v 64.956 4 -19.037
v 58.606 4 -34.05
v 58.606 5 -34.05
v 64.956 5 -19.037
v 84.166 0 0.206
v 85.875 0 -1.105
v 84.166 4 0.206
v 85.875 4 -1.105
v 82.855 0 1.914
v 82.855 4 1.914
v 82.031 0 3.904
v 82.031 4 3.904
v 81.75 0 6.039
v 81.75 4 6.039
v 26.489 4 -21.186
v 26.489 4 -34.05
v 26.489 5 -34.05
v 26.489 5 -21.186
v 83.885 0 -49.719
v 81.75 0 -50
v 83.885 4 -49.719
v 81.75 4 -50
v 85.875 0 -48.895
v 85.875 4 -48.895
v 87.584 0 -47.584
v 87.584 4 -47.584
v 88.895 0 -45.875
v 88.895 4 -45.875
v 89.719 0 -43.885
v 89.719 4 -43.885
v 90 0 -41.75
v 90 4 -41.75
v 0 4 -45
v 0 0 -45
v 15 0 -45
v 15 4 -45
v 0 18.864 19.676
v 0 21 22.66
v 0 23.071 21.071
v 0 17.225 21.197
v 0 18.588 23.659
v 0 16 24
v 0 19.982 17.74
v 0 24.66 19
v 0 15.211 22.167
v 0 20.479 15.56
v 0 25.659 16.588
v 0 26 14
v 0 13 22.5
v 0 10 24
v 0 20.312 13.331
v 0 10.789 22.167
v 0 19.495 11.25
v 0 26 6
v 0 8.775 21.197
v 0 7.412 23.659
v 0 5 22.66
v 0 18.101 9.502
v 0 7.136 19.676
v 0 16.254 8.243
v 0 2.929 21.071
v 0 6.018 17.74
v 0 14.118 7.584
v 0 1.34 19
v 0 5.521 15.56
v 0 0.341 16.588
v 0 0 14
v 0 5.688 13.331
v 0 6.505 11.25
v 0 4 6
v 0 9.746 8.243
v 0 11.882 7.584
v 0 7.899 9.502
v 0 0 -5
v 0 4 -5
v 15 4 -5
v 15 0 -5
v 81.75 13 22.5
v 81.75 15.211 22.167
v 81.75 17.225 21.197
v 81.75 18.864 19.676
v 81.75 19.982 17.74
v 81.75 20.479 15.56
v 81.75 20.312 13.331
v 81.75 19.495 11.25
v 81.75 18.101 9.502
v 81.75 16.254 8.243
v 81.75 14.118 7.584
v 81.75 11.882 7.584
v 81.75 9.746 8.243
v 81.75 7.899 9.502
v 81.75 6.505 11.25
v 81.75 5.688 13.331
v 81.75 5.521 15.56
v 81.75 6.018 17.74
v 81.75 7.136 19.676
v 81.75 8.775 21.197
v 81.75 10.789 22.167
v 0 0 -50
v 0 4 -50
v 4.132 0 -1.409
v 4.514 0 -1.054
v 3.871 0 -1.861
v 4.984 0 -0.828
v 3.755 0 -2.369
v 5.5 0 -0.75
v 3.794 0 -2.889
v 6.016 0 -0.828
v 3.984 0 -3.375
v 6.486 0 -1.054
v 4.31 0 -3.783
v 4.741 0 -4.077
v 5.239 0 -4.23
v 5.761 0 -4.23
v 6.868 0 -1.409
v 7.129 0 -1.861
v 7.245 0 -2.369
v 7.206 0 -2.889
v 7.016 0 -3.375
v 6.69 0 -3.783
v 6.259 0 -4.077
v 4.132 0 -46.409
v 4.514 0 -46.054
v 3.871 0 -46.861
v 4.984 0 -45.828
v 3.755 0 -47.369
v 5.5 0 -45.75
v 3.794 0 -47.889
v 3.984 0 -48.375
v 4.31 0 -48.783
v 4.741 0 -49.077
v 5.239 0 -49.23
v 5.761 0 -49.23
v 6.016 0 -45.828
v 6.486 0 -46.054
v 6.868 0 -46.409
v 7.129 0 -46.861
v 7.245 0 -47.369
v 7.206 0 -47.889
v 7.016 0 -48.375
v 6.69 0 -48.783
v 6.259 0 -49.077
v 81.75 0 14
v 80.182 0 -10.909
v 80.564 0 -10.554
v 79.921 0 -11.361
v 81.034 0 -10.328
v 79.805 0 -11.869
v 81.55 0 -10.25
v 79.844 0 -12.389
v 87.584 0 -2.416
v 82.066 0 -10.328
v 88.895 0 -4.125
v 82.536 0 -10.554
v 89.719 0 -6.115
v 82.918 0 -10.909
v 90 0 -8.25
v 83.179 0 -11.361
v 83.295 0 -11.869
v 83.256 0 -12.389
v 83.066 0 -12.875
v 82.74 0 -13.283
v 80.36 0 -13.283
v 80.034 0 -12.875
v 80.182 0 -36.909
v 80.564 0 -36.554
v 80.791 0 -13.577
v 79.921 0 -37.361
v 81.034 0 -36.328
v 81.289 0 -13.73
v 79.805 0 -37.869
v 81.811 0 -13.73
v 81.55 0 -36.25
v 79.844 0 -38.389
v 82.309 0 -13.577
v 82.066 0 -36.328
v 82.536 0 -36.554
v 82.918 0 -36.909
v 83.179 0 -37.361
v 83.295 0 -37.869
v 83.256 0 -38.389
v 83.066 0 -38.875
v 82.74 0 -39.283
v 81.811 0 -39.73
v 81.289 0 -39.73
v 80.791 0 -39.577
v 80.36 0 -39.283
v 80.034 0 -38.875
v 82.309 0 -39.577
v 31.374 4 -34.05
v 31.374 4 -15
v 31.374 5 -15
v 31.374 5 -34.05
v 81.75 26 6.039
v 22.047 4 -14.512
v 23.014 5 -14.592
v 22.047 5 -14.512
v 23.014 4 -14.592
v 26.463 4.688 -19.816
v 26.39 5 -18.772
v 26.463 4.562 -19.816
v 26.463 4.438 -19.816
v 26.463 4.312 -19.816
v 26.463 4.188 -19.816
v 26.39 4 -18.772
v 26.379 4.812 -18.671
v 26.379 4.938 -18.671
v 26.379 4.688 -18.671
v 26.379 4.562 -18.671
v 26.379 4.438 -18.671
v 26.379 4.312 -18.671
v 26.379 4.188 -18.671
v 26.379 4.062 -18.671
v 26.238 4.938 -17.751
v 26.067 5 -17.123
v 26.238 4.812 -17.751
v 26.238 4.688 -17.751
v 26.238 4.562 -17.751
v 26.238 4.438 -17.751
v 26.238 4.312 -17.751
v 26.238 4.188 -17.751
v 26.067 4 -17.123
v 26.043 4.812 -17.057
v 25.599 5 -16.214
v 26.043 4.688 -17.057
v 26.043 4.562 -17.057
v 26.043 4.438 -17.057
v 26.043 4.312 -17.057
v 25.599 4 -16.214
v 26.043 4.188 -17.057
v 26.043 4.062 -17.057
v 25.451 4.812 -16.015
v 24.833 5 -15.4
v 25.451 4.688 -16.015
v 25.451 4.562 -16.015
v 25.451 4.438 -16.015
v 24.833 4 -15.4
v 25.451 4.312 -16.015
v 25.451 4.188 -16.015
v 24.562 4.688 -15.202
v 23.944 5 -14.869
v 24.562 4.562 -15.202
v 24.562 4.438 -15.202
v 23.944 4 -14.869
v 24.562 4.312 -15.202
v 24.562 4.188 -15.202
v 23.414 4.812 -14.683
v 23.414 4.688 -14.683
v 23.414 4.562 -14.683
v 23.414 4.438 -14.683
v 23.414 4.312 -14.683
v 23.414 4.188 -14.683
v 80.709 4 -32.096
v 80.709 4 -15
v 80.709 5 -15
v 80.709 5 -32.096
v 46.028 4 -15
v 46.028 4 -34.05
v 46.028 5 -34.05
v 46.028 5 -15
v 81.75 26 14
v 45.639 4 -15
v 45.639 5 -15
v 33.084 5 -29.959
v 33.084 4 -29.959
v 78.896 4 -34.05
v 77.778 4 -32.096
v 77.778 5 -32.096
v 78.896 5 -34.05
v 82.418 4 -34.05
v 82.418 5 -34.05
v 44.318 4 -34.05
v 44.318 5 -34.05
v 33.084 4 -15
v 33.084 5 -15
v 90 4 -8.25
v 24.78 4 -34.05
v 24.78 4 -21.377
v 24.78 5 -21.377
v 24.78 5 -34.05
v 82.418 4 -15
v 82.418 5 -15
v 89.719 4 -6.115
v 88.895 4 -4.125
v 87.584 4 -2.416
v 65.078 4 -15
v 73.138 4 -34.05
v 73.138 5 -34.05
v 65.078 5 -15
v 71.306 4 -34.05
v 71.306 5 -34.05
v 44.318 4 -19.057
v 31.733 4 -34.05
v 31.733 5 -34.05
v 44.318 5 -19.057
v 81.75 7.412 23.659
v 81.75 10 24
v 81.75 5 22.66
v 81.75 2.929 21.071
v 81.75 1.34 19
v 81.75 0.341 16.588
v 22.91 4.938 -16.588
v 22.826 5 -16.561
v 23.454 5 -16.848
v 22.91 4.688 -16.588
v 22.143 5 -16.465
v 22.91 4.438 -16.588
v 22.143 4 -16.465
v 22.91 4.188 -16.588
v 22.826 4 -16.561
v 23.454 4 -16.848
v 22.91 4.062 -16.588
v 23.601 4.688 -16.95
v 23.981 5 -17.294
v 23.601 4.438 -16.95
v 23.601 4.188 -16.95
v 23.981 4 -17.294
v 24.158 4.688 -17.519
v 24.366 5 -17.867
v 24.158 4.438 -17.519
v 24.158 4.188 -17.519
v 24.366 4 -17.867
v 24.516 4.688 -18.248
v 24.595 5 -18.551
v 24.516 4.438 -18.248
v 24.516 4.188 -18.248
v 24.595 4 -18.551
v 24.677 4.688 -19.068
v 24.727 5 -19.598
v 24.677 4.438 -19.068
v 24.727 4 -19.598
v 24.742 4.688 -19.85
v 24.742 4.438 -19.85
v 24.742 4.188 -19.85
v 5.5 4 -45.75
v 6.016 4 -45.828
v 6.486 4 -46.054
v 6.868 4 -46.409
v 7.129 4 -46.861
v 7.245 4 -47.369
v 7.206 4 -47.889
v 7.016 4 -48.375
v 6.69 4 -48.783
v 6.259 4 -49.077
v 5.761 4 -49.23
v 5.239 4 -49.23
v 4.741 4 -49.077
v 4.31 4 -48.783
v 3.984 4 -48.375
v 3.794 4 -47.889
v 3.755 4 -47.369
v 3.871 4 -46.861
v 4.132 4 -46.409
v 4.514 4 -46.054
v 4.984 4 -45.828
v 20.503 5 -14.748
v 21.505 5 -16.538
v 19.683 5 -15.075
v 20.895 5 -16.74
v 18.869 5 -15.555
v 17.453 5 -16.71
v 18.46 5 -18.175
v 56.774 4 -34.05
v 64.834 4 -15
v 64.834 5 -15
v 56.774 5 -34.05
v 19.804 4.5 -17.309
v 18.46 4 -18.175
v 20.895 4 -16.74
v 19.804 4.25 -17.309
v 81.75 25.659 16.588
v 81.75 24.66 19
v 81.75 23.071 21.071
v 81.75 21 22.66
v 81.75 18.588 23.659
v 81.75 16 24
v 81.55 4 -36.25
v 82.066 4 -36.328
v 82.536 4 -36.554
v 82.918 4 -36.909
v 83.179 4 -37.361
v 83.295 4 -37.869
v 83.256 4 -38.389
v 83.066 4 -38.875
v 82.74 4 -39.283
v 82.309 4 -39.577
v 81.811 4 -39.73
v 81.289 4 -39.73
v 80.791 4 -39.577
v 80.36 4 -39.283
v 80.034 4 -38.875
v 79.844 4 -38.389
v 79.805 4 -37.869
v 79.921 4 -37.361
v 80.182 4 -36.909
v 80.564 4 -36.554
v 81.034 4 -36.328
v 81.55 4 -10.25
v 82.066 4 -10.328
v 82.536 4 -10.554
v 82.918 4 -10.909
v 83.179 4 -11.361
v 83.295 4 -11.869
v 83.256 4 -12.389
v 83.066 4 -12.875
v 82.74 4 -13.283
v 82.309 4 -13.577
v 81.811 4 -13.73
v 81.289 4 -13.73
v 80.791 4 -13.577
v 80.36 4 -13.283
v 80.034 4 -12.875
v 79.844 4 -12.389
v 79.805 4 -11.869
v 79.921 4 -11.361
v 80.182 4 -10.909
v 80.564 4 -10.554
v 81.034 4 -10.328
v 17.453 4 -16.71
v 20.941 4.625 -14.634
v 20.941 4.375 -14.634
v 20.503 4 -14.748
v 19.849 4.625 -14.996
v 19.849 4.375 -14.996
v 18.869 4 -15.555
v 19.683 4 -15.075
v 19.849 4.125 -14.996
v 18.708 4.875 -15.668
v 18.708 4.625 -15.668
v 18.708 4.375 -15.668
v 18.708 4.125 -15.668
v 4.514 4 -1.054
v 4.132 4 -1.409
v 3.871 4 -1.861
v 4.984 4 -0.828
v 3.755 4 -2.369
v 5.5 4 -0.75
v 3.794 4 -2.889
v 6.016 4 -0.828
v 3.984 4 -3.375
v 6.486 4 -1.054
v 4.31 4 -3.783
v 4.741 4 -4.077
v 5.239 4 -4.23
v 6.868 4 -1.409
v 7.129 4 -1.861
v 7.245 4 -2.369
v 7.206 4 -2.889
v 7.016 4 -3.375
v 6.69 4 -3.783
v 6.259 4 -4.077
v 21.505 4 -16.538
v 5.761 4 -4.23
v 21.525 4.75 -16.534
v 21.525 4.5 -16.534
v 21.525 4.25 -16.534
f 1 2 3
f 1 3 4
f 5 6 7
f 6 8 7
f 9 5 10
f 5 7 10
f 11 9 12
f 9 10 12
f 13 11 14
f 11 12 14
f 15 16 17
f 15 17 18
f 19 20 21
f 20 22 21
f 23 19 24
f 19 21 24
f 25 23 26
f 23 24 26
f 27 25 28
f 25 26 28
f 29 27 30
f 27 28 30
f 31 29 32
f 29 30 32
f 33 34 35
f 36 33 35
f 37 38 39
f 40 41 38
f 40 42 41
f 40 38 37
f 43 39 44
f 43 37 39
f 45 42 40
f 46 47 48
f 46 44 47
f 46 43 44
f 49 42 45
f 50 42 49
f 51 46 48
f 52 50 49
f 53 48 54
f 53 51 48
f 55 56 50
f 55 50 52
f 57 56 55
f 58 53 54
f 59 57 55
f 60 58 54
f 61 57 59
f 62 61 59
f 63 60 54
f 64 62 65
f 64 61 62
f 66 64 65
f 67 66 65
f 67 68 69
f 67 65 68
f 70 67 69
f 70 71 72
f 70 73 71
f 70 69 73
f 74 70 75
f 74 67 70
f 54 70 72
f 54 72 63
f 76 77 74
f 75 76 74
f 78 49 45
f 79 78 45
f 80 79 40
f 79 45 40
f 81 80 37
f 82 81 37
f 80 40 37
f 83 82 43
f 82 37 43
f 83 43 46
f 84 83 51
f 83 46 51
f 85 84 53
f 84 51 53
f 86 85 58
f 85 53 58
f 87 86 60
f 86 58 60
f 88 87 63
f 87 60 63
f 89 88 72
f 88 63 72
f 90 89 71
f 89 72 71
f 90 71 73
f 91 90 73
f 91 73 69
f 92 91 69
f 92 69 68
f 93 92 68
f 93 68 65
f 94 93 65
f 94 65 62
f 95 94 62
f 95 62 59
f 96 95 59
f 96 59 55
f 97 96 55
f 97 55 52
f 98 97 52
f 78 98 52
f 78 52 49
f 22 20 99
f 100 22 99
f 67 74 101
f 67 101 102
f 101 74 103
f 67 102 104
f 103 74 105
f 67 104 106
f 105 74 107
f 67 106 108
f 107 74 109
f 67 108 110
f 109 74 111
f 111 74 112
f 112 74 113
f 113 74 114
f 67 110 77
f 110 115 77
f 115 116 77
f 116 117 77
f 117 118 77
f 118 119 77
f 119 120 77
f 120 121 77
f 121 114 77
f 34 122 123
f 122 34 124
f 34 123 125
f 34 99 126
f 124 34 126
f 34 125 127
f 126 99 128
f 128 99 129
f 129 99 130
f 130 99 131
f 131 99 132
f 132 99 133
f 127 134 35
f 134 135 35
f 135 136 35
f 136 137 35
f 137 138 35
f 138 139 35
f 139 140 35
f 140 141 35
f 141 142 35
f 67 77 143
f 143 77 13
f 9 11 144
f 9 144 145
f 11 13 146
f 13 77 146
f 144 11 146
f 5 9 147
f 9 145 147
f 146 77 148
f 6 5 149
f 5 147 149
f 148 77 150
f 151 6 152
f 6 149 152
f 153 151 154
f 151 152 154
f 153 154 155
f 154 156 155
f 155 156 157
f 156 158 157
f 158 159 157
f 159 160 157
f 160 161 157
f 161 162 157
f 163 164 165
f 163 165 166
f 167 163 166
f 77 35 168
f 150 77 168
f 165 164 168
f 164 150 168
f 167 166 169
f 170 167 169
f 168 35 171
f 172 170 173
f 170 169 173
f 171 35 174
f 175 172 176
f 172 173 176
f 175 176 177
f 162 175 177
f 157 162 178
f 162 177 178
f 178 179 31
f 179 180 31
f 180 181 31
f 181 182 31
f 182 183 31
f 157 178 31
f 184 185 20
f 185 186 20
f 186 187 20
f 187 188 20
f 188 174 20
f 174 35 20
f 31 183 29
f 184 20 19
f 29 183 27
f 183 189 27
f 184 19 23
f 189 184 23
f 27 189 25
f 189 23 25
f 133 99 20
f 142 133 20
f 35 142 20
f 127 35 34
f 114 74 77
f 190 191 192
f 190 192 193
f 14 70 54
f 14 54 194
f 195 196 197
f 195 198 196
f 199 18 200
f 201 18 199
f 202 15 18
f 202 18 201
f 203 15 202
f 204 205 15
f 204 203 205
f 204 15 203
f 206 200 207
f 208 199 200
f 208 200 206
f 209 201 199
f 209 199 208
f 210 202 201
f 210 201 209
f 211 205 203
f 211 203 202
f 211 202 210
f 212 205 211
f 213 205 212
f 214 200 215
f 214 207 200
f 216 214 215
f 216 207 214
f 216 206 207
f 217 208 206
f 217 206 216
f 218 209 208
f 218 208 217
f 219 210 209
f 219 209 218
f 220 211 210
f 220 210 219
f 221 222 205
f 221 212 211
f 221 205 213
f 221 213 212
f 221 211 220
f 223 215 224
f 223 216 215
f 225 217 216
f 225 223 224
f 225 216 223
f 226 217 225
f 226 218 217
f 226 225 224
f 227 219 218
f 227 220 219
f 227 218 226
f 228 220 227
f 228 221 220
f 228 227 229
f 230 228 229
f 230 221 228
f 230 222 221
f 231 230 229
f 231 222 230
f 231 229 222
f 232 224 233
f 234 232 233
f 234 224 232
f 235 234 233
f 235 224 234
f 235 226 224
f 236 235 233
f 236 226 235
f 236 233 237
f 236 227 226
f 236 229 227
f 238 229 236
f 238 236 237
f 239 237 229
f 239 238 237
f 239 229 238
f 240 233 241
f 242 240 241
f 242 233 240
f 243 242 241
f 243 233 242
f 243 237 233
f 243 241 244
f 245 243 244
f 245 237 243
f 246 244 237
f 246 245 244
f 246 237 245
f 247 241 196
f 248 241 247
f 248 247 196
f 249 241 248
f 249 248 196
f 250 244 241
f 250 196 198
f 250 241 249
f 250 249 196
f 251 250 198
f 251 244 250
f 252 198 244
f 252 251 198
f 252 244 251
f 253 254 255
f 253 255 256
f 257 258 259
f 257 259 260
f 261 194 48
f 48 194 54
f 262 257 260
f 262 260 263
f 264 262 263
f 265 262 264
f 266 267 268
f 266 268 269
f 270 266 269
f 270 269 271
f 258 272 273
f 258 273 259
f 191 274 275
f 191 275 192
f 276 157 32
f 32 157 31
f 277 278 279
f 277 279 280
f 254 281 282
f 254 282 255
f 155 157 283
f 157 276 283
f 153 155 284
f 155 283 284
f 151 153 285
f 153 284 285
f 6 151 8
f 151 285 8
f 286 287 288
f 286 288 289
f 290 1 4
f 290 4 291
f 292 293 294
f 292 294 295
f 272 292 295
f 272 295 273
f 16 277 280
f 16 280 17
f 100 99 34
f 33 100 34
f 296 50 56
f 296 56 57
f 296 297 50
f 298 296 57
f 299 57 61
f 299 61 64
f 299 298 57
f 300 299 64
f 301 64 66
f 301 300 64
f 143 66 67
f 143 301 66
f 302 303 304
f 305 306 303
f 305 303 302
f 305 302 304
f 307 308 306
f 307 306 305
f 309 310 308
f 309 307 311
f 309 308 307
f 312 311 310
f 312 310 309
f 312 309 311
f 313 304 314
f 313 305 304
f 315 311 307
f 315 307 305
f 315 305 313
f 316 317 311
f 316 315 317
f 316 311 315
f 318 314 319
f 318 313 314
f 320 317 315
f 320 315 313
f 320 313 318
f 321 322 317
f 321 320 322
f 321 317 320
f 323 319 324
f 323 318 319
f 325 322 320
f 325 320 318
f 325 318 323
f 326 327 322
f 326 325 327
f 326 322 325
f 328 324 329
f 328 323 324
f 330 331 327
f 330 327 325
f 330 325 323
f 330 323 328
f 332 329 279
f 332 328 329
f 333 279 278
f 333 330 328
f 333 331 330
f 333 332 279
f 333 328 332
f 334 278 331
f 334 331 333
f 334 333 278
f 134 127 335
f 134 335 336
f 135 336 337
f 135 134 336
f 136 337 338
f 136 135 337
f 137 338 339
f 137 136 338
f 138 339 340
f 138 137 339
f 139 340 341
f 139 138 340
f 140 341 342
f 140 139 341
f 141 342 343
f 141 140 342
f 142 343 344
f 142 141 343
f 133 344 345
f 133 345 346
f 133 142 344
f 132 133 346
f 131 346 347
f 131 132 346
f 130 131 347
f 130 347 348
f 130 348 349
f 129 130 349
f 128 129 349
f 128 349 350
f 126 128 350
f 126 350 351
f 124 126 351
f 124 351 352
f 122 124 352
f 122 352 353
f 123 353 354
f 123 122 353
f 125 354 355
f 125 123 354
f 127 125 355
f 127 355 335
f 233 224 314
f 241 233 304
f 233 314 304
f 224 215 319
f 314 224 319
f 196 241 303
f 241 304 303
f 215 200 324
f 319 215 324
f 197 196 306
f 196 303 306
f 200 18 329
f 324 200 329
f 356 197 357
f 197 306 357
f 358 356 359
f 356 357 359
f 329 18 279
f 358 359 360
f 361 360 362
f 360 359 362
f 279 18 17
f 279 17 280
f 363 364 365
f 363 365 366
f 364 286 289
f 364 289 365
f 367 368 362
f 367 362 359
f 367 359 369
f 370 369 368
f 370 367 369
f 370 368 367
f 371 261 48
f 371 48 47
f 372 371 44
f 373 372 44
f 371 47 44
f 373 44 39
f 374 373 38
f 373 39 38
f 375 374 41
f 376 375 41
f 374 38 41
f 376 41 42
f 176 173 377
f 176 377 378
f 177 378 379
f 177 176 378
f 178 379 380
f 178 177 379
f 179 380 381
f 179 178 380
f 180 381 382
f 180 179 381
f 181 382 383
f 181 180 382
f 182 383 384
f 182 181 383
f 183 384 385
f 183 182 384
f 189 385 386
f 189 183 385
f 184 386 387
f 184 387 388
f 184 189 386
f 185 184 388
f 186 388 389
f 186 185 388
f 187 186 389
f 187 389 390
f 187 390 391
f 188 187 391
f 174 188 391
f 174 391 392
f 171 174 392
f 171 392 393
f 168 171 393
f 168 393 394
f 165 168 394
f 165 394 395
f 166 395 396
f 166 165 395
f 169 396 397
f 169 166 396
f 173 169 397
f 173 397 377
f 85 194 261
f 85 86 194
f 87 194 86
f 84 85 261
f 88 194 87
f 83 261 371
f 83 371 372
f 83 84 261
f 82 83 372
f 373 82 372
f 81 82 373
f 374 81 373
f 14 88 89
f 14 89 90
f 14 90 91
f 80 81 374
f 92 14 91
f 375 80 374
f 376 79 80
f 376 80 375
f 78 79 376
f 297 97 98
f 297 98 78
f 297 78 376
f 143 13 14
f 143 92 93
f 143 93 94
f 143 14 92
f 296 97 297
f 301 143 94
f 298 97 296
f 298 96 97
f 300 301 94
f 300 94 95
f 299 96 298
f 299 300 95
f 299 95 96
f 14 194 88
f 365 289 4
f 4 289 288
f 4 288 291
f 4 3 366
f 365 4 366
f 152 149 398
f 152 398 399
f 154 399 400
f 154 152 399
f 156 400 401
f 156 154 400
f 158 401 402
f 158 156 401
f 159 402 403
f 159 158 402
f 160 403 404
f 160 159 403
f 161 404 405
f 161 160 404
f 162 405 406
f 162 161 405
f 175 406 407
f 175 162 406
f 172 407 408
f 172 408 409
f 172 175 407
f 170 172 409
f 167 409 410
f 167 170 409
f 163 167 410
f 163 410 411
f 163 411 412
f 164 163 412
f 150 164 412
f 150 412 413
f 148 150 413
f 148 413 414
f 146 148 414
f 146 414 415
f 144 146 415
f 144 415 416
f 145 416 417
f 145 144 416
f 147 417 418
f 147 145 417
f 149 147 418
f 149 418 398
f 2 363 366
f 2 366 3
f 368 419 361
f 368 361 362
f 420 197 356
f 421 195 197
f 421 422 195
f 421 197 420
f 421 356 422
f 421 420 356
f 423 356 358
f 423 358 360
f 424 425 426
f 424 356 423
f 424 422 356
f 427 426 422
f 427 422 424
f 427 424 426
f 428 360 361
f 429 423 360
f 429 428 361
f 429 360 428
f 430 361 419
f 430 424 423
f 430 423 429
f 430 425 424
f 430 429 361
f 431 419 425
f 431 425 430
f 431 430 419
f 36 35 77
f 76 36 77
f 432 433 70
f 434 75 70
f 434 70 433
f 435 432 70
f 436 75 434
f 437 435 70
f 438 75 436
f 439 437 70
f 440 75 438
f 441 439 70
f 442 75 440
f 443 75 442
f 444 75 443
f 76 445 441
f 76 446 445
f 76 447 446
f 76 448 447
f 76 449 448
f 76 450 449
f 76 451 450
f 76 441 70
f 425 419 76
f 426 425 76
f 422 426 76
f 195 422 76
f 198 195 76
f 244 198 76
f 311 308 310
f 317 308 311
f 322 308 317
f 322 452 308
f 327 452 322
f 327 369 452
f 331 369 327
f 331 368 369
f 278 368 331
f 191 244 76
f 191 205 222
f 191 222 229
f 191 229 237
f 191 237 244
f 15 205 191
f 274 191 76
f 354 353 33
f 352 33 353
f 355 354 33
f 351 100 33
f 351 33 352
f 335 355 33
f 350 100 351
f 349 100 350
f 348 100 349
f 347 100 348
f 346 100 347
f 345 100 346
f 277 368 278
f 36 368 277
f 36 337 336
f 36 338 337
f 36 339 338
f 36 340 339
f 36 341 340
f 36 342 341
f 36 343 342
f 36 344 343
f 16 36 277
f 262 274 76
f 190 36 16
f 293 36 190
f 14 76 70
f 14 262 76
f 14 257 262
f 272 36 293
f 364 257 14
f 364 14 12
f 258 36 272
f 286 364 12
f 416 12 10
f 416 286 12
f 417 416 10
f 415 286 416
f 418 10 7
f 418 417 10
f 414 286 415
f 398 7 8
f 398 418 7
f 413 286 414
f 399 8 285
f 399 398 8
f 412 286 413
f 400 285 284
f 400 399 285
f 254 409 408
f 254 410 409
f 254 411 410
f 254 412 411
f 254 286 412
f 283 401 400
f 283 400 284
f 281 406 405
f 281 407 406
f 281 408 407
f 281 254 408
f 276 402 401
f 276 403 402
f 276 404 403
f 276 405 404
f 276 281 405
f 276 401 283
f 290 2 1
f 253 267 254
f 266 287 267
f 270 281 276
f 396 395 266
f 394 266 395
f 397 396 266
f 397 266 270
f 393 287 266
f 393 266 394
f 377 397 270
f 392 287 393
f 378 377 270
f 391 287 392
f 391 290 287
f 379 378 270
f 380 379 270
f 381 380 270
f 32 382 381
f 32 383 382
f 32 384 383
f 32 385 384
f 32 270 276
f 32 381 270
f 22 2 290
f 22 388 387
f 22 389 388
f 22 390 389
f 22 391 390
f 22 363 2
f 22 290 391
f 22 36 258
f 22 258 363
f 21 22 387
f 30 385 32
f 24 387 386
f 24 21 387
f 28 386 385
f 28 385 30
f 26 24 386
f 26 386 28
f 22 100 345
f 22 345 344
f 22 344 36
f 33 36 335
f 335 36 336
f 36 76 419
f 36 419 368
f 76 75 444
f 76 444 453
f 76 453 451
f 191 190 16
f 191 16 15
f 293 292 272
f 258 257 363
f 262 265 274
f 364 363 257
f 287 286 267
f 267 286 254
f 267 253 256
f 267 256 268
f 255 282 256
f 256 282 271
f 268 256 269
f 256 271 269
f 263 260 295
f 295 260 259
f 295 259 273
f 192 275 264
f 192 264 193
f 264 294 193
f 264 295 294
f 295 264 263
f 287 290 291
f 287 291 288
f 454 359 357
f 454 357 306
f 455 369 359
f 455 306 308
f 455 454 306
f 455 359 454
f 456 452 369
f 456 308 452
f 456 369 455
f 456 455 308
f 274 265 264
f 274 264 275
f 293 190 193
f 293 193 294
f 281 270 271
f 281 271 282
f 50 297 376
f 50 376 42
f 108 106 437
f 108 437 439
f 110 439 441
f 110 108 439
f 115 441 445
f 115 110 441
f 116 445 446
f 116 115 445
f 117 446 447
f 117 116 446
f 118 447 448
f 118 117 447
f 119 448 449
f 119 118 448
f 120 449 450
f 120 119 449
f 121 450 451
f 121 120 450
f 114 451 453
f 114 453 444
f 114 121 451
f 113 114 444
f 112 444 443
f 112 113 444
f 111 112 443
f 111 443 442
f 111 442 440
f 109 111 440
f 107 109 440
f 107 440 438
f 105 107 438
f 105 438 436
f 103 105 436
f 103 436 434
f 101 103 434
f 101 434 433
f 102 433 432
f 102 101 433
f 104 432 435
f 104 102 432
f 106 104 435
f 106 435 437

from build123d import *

# Parameters (mm, degrees)
SKETCH1_R           = 1.75
BOSS_EXTRUDE1_DEPTH = 4
FILLET1_R           = 8.25
SKETCH2_W           = 81.75
SKETCH2_H           = 4
BOSS_EXTRUDE2_DEPTH = 24
FILLET3_R           = 8.25
BOSS_EXTRUDE4_DEPTH = 1
BOSS_EXTRUDE6_DEPTH = 22
SKETCH7_R           = 7.5
CUT_EXTRUDE2_DEPTH  = 115
FILLET6_R           = 10


with BuildPart() as part:
    # Sketch1 → Boss-Extrude1 (new body)
    with BuildSketch(Plane(origin=(0, 0, 0), x_dir=(1, 0, 0), z_dir=(0, 1, 0))):
        Polygon((0, 45), (15, 45), (15, 5), (0, 5), (0, 0), (90, 0), (90, 50), (0, 50), align=None)
        with Locations(Location((5.5, 2.5, 0), (0, 0, 270))):
            Circle(SKETCH1_R, mode=Mode.SUBTRACT)
        with Locations(Location((5.5, 47.5, 0), (0, 0, 270))):
            Circle(SKETCH1_R, mode=Mode.SUBTRACT)
        with Locations(Location((81.55, 12, 0), (0, 0, 270))):
            Circle(SKETCH1_R, mode=Mode.SUBTRACT)
        with Locations(Location((81.55, 38, 0), (0, 0, 270))):
            Circle(SKETCH1_R, mode=Mode.SUBTRACT)
    extrude(amount=BOSS_EXTRUDE1_DEPTH)

    # Fillet1
    fillet1_edges = [part.edges().sort_by_distance(p)[0] for p in [
        (90, 2, -50),
        (90, 2, 0),
    ]]
    fillet(fillet1_edges, radius=FILLET1_R)

    # Sketch2 → Boss-Extrude2 (add)
    with BuildSketch(Plane.XY):
        with Locations((40.875, 2)):
            Rectangle(SKETCH2_W, SKETCH2_H)
    extrude(amount=BOSS_EXTRUDE2_DEPTH)

    # Fillet3
    fillet3_edges = [part.edges().sort_by_distance(p)[0] for p in [
        (81.75, 2, 0),
    ]]
    fillet(fillet3_edges, radius=FILLET3_R)

    # Sketch5 → Boss-Extrude4 (add)
    with BuildSketch(Plane(origin=(0, 4, 0), x_dir=(1, 0, 0), z_dir=(0, 1, 0))):
        Polygon((78.896003606, 34.05), (82.418269231, 34.05), (82.418269231, 15), (80.708653846, 15), (80.708653846, 32.096153846), (77.777884615, 32.096153846), align=None)
        Polygon((56.774038462, 34.05), (58.605769231, 34.05), (64.955769231, 19.037439904), (71.305769231, 34.05), (73.1375, 34.05), (65.077884615, 15), (64.833653846, 15), align=None)
        Polygon((31.374038462, 15), (31.374038462, 34.05), (31.732752404, 34.05), (44.318269231, 19.056520433), (44.318269231, 34.05), (46.027884615, 34.05), (46.027884615, 15), (45.638641827, 15), (33.083653846, 29.959134615), (33.083653846, 15), align=None)
        with BuildLine():
            Line((24.779807692, 34.05), (26.489423077, 34.05))
            Line((26.489423077, 34.05), (26.489423077, 21.185907452))
            add(Edge.make_bspline(
                [(26.489423077, 21.185907452), (26.487714463, 20.94802645), (26.484433715, 20.4912659), (26.466393852, 19.833366552), (26.433010208, 19.232634675), (26.384378211, 18.68770427), (26.319498087, 18.200282505), (26.245251919, 17.766603171), (26.155375115, 17.390285757), (26.020030491, 16.967727607), (25.798103714, 16.504302041), (25.464091692, 16.003803293), (25.049167471, 15.566015729), (24.568557562, 15.185817326), (24.018061417, 14.882882968), (23.409015395, 14.66541264), (22.745168684, 14.532765549), (22.284707257, 14.518756151), (22.047475962, 14.511538462)],
                knots=[0, 0, 0, 0, 1.237770943, 2.376671248, 3.424123796, 4.367912054, 5.222547132, 5.982086412, 6.656319012, 7.234008312, 8.288027371, 9.317870876, 10.352700517, 11.413286737, 12.494591526, 13.606319346, 14.766767577, 16, 16, 16, 16], degree=3))
            add(Edge.make_bspline(
                [(22.047475962, 14.511538462), (21.862645469, 14.517420063), (21.490754275, 14.529254234), (20.937266275, 14.625710986), (20.385349806, 14.774388308), (19.832075492, 14.99211672), (19.266512335, 15.28823862), (18.681000534, 15.675687408), (18.068008595, 16.153741858), (17.664239566, 16.518618731), (17.452884615, 16.709615385)],
                knots=[0, 0, 0, 0, 0.848567217, 1.707373443, 2.573483905, 3.470863513, 4.432650262, 5.500696352, 6.691726801, 8, 8, 8, 8], degree=3))
            Line((17.452884615, 16.709615385), (18.460336538, 18.175))
            add(Edge.make_bspline(
                [(18.460336538, 18.175), (18.69276112, 18.014722029), (19.131609036, 17.712096322), (19.776611779, 17.322787254), (20.348096283, 16.989003138), (20.721927753, 16.818901448), (20.895012019, 16.740144231)],
                knots=[0, 0, 0, 0, 1.196737151, 2.259595785, 3.194191475, 4, 4, 4, 4], degree=3))
            add(Edge.make_bspline(
                [(20.895012019, 16.740144231), (20.999973772, 16.698999184), (21.205827143, 16.618304586), (21.520560791, 16.528247625), (21.833498063, 16.47903108), (22.040967226, 16.469879824), (22.142878606, 16.465384615)],
                knots=[0, 0, 0, 0, 1.051806502, 2.062826769, 3.048436908, 4, 4, 4, 4], degree=3))
            add(Edge.make_bspline(
                [(22.142878606, 16.465384615), (22.274502068, 16.470951216), (22.534673123, 16.481954332), (22.912755719, 16.579105387), (23.274477289, 16.72739278), (23.606870712, 16.944515394), (23.913224033, 17.202677841), (24.166005698, 17.514858402), (24.376738129, 17.860838972), (24.503555031, 18.1883436), (24.584353004, 18.487029259), (24.635633573, 18.761529612), (24.680475425, 19.082448517), (24.719563586, 19.450169036), (24.742447919, 19.86542737), (24.768123361, 20.327004205), (24.777404852, 20.83606327), (24.778982306, 21.190997165), (24.779807692, 21.37671274)],
                knots=[0, 0, 0, 0, 0.997221856, 1.971139923, 2.944579524, 3.951425367, 4.971190333, 5.972282193, 6.985401279, 8.033996657, 8.624075553, 9.332086008, 10.151144245, 11.082816738, 12.137127781, 13.306538797, 14.590673636, 16, 16, 16, 16], degree=3))
            Line((24.779807692, 21.37671274), (24.779807692, 34.05))
        make_face()
    extrude(amount=BOSS_EXTRUDE4_DEPTH)

    # Sketch6 → Boss-Extrude6 (add)
    with BuildSketch(Plane(origin=(0, 4, 0), x_dir=(1, 0, 0), z_dir=(0, 1, 0))):
        Polygon((0, -24), (0, -6), (81.75, -6.039419162), (81.75, -24), align=None)
    extrude(amount=BOSS_EXTRUDE6_DEPTH)

    # Sketch7 → Cut-Extrude2 (cut)
    with BuildSketch(Plane.ZY):
        with Locations((15, 13)):
            Circle(SKETCH7_R)
    extrude(amount=-CUT_EXTRUDE2_DEPTH, mode=Mode.SUBTRACT)

    # Fillet6
    fillet6_edges = [part.edges().sort_by_distance(p)[0] for p in [
        (40.875, 26, 24),
        (40.875, 0, 24),
    ]]
    fillet(fillet6_edges, radius=FILLET6_R)


solid = part.part
